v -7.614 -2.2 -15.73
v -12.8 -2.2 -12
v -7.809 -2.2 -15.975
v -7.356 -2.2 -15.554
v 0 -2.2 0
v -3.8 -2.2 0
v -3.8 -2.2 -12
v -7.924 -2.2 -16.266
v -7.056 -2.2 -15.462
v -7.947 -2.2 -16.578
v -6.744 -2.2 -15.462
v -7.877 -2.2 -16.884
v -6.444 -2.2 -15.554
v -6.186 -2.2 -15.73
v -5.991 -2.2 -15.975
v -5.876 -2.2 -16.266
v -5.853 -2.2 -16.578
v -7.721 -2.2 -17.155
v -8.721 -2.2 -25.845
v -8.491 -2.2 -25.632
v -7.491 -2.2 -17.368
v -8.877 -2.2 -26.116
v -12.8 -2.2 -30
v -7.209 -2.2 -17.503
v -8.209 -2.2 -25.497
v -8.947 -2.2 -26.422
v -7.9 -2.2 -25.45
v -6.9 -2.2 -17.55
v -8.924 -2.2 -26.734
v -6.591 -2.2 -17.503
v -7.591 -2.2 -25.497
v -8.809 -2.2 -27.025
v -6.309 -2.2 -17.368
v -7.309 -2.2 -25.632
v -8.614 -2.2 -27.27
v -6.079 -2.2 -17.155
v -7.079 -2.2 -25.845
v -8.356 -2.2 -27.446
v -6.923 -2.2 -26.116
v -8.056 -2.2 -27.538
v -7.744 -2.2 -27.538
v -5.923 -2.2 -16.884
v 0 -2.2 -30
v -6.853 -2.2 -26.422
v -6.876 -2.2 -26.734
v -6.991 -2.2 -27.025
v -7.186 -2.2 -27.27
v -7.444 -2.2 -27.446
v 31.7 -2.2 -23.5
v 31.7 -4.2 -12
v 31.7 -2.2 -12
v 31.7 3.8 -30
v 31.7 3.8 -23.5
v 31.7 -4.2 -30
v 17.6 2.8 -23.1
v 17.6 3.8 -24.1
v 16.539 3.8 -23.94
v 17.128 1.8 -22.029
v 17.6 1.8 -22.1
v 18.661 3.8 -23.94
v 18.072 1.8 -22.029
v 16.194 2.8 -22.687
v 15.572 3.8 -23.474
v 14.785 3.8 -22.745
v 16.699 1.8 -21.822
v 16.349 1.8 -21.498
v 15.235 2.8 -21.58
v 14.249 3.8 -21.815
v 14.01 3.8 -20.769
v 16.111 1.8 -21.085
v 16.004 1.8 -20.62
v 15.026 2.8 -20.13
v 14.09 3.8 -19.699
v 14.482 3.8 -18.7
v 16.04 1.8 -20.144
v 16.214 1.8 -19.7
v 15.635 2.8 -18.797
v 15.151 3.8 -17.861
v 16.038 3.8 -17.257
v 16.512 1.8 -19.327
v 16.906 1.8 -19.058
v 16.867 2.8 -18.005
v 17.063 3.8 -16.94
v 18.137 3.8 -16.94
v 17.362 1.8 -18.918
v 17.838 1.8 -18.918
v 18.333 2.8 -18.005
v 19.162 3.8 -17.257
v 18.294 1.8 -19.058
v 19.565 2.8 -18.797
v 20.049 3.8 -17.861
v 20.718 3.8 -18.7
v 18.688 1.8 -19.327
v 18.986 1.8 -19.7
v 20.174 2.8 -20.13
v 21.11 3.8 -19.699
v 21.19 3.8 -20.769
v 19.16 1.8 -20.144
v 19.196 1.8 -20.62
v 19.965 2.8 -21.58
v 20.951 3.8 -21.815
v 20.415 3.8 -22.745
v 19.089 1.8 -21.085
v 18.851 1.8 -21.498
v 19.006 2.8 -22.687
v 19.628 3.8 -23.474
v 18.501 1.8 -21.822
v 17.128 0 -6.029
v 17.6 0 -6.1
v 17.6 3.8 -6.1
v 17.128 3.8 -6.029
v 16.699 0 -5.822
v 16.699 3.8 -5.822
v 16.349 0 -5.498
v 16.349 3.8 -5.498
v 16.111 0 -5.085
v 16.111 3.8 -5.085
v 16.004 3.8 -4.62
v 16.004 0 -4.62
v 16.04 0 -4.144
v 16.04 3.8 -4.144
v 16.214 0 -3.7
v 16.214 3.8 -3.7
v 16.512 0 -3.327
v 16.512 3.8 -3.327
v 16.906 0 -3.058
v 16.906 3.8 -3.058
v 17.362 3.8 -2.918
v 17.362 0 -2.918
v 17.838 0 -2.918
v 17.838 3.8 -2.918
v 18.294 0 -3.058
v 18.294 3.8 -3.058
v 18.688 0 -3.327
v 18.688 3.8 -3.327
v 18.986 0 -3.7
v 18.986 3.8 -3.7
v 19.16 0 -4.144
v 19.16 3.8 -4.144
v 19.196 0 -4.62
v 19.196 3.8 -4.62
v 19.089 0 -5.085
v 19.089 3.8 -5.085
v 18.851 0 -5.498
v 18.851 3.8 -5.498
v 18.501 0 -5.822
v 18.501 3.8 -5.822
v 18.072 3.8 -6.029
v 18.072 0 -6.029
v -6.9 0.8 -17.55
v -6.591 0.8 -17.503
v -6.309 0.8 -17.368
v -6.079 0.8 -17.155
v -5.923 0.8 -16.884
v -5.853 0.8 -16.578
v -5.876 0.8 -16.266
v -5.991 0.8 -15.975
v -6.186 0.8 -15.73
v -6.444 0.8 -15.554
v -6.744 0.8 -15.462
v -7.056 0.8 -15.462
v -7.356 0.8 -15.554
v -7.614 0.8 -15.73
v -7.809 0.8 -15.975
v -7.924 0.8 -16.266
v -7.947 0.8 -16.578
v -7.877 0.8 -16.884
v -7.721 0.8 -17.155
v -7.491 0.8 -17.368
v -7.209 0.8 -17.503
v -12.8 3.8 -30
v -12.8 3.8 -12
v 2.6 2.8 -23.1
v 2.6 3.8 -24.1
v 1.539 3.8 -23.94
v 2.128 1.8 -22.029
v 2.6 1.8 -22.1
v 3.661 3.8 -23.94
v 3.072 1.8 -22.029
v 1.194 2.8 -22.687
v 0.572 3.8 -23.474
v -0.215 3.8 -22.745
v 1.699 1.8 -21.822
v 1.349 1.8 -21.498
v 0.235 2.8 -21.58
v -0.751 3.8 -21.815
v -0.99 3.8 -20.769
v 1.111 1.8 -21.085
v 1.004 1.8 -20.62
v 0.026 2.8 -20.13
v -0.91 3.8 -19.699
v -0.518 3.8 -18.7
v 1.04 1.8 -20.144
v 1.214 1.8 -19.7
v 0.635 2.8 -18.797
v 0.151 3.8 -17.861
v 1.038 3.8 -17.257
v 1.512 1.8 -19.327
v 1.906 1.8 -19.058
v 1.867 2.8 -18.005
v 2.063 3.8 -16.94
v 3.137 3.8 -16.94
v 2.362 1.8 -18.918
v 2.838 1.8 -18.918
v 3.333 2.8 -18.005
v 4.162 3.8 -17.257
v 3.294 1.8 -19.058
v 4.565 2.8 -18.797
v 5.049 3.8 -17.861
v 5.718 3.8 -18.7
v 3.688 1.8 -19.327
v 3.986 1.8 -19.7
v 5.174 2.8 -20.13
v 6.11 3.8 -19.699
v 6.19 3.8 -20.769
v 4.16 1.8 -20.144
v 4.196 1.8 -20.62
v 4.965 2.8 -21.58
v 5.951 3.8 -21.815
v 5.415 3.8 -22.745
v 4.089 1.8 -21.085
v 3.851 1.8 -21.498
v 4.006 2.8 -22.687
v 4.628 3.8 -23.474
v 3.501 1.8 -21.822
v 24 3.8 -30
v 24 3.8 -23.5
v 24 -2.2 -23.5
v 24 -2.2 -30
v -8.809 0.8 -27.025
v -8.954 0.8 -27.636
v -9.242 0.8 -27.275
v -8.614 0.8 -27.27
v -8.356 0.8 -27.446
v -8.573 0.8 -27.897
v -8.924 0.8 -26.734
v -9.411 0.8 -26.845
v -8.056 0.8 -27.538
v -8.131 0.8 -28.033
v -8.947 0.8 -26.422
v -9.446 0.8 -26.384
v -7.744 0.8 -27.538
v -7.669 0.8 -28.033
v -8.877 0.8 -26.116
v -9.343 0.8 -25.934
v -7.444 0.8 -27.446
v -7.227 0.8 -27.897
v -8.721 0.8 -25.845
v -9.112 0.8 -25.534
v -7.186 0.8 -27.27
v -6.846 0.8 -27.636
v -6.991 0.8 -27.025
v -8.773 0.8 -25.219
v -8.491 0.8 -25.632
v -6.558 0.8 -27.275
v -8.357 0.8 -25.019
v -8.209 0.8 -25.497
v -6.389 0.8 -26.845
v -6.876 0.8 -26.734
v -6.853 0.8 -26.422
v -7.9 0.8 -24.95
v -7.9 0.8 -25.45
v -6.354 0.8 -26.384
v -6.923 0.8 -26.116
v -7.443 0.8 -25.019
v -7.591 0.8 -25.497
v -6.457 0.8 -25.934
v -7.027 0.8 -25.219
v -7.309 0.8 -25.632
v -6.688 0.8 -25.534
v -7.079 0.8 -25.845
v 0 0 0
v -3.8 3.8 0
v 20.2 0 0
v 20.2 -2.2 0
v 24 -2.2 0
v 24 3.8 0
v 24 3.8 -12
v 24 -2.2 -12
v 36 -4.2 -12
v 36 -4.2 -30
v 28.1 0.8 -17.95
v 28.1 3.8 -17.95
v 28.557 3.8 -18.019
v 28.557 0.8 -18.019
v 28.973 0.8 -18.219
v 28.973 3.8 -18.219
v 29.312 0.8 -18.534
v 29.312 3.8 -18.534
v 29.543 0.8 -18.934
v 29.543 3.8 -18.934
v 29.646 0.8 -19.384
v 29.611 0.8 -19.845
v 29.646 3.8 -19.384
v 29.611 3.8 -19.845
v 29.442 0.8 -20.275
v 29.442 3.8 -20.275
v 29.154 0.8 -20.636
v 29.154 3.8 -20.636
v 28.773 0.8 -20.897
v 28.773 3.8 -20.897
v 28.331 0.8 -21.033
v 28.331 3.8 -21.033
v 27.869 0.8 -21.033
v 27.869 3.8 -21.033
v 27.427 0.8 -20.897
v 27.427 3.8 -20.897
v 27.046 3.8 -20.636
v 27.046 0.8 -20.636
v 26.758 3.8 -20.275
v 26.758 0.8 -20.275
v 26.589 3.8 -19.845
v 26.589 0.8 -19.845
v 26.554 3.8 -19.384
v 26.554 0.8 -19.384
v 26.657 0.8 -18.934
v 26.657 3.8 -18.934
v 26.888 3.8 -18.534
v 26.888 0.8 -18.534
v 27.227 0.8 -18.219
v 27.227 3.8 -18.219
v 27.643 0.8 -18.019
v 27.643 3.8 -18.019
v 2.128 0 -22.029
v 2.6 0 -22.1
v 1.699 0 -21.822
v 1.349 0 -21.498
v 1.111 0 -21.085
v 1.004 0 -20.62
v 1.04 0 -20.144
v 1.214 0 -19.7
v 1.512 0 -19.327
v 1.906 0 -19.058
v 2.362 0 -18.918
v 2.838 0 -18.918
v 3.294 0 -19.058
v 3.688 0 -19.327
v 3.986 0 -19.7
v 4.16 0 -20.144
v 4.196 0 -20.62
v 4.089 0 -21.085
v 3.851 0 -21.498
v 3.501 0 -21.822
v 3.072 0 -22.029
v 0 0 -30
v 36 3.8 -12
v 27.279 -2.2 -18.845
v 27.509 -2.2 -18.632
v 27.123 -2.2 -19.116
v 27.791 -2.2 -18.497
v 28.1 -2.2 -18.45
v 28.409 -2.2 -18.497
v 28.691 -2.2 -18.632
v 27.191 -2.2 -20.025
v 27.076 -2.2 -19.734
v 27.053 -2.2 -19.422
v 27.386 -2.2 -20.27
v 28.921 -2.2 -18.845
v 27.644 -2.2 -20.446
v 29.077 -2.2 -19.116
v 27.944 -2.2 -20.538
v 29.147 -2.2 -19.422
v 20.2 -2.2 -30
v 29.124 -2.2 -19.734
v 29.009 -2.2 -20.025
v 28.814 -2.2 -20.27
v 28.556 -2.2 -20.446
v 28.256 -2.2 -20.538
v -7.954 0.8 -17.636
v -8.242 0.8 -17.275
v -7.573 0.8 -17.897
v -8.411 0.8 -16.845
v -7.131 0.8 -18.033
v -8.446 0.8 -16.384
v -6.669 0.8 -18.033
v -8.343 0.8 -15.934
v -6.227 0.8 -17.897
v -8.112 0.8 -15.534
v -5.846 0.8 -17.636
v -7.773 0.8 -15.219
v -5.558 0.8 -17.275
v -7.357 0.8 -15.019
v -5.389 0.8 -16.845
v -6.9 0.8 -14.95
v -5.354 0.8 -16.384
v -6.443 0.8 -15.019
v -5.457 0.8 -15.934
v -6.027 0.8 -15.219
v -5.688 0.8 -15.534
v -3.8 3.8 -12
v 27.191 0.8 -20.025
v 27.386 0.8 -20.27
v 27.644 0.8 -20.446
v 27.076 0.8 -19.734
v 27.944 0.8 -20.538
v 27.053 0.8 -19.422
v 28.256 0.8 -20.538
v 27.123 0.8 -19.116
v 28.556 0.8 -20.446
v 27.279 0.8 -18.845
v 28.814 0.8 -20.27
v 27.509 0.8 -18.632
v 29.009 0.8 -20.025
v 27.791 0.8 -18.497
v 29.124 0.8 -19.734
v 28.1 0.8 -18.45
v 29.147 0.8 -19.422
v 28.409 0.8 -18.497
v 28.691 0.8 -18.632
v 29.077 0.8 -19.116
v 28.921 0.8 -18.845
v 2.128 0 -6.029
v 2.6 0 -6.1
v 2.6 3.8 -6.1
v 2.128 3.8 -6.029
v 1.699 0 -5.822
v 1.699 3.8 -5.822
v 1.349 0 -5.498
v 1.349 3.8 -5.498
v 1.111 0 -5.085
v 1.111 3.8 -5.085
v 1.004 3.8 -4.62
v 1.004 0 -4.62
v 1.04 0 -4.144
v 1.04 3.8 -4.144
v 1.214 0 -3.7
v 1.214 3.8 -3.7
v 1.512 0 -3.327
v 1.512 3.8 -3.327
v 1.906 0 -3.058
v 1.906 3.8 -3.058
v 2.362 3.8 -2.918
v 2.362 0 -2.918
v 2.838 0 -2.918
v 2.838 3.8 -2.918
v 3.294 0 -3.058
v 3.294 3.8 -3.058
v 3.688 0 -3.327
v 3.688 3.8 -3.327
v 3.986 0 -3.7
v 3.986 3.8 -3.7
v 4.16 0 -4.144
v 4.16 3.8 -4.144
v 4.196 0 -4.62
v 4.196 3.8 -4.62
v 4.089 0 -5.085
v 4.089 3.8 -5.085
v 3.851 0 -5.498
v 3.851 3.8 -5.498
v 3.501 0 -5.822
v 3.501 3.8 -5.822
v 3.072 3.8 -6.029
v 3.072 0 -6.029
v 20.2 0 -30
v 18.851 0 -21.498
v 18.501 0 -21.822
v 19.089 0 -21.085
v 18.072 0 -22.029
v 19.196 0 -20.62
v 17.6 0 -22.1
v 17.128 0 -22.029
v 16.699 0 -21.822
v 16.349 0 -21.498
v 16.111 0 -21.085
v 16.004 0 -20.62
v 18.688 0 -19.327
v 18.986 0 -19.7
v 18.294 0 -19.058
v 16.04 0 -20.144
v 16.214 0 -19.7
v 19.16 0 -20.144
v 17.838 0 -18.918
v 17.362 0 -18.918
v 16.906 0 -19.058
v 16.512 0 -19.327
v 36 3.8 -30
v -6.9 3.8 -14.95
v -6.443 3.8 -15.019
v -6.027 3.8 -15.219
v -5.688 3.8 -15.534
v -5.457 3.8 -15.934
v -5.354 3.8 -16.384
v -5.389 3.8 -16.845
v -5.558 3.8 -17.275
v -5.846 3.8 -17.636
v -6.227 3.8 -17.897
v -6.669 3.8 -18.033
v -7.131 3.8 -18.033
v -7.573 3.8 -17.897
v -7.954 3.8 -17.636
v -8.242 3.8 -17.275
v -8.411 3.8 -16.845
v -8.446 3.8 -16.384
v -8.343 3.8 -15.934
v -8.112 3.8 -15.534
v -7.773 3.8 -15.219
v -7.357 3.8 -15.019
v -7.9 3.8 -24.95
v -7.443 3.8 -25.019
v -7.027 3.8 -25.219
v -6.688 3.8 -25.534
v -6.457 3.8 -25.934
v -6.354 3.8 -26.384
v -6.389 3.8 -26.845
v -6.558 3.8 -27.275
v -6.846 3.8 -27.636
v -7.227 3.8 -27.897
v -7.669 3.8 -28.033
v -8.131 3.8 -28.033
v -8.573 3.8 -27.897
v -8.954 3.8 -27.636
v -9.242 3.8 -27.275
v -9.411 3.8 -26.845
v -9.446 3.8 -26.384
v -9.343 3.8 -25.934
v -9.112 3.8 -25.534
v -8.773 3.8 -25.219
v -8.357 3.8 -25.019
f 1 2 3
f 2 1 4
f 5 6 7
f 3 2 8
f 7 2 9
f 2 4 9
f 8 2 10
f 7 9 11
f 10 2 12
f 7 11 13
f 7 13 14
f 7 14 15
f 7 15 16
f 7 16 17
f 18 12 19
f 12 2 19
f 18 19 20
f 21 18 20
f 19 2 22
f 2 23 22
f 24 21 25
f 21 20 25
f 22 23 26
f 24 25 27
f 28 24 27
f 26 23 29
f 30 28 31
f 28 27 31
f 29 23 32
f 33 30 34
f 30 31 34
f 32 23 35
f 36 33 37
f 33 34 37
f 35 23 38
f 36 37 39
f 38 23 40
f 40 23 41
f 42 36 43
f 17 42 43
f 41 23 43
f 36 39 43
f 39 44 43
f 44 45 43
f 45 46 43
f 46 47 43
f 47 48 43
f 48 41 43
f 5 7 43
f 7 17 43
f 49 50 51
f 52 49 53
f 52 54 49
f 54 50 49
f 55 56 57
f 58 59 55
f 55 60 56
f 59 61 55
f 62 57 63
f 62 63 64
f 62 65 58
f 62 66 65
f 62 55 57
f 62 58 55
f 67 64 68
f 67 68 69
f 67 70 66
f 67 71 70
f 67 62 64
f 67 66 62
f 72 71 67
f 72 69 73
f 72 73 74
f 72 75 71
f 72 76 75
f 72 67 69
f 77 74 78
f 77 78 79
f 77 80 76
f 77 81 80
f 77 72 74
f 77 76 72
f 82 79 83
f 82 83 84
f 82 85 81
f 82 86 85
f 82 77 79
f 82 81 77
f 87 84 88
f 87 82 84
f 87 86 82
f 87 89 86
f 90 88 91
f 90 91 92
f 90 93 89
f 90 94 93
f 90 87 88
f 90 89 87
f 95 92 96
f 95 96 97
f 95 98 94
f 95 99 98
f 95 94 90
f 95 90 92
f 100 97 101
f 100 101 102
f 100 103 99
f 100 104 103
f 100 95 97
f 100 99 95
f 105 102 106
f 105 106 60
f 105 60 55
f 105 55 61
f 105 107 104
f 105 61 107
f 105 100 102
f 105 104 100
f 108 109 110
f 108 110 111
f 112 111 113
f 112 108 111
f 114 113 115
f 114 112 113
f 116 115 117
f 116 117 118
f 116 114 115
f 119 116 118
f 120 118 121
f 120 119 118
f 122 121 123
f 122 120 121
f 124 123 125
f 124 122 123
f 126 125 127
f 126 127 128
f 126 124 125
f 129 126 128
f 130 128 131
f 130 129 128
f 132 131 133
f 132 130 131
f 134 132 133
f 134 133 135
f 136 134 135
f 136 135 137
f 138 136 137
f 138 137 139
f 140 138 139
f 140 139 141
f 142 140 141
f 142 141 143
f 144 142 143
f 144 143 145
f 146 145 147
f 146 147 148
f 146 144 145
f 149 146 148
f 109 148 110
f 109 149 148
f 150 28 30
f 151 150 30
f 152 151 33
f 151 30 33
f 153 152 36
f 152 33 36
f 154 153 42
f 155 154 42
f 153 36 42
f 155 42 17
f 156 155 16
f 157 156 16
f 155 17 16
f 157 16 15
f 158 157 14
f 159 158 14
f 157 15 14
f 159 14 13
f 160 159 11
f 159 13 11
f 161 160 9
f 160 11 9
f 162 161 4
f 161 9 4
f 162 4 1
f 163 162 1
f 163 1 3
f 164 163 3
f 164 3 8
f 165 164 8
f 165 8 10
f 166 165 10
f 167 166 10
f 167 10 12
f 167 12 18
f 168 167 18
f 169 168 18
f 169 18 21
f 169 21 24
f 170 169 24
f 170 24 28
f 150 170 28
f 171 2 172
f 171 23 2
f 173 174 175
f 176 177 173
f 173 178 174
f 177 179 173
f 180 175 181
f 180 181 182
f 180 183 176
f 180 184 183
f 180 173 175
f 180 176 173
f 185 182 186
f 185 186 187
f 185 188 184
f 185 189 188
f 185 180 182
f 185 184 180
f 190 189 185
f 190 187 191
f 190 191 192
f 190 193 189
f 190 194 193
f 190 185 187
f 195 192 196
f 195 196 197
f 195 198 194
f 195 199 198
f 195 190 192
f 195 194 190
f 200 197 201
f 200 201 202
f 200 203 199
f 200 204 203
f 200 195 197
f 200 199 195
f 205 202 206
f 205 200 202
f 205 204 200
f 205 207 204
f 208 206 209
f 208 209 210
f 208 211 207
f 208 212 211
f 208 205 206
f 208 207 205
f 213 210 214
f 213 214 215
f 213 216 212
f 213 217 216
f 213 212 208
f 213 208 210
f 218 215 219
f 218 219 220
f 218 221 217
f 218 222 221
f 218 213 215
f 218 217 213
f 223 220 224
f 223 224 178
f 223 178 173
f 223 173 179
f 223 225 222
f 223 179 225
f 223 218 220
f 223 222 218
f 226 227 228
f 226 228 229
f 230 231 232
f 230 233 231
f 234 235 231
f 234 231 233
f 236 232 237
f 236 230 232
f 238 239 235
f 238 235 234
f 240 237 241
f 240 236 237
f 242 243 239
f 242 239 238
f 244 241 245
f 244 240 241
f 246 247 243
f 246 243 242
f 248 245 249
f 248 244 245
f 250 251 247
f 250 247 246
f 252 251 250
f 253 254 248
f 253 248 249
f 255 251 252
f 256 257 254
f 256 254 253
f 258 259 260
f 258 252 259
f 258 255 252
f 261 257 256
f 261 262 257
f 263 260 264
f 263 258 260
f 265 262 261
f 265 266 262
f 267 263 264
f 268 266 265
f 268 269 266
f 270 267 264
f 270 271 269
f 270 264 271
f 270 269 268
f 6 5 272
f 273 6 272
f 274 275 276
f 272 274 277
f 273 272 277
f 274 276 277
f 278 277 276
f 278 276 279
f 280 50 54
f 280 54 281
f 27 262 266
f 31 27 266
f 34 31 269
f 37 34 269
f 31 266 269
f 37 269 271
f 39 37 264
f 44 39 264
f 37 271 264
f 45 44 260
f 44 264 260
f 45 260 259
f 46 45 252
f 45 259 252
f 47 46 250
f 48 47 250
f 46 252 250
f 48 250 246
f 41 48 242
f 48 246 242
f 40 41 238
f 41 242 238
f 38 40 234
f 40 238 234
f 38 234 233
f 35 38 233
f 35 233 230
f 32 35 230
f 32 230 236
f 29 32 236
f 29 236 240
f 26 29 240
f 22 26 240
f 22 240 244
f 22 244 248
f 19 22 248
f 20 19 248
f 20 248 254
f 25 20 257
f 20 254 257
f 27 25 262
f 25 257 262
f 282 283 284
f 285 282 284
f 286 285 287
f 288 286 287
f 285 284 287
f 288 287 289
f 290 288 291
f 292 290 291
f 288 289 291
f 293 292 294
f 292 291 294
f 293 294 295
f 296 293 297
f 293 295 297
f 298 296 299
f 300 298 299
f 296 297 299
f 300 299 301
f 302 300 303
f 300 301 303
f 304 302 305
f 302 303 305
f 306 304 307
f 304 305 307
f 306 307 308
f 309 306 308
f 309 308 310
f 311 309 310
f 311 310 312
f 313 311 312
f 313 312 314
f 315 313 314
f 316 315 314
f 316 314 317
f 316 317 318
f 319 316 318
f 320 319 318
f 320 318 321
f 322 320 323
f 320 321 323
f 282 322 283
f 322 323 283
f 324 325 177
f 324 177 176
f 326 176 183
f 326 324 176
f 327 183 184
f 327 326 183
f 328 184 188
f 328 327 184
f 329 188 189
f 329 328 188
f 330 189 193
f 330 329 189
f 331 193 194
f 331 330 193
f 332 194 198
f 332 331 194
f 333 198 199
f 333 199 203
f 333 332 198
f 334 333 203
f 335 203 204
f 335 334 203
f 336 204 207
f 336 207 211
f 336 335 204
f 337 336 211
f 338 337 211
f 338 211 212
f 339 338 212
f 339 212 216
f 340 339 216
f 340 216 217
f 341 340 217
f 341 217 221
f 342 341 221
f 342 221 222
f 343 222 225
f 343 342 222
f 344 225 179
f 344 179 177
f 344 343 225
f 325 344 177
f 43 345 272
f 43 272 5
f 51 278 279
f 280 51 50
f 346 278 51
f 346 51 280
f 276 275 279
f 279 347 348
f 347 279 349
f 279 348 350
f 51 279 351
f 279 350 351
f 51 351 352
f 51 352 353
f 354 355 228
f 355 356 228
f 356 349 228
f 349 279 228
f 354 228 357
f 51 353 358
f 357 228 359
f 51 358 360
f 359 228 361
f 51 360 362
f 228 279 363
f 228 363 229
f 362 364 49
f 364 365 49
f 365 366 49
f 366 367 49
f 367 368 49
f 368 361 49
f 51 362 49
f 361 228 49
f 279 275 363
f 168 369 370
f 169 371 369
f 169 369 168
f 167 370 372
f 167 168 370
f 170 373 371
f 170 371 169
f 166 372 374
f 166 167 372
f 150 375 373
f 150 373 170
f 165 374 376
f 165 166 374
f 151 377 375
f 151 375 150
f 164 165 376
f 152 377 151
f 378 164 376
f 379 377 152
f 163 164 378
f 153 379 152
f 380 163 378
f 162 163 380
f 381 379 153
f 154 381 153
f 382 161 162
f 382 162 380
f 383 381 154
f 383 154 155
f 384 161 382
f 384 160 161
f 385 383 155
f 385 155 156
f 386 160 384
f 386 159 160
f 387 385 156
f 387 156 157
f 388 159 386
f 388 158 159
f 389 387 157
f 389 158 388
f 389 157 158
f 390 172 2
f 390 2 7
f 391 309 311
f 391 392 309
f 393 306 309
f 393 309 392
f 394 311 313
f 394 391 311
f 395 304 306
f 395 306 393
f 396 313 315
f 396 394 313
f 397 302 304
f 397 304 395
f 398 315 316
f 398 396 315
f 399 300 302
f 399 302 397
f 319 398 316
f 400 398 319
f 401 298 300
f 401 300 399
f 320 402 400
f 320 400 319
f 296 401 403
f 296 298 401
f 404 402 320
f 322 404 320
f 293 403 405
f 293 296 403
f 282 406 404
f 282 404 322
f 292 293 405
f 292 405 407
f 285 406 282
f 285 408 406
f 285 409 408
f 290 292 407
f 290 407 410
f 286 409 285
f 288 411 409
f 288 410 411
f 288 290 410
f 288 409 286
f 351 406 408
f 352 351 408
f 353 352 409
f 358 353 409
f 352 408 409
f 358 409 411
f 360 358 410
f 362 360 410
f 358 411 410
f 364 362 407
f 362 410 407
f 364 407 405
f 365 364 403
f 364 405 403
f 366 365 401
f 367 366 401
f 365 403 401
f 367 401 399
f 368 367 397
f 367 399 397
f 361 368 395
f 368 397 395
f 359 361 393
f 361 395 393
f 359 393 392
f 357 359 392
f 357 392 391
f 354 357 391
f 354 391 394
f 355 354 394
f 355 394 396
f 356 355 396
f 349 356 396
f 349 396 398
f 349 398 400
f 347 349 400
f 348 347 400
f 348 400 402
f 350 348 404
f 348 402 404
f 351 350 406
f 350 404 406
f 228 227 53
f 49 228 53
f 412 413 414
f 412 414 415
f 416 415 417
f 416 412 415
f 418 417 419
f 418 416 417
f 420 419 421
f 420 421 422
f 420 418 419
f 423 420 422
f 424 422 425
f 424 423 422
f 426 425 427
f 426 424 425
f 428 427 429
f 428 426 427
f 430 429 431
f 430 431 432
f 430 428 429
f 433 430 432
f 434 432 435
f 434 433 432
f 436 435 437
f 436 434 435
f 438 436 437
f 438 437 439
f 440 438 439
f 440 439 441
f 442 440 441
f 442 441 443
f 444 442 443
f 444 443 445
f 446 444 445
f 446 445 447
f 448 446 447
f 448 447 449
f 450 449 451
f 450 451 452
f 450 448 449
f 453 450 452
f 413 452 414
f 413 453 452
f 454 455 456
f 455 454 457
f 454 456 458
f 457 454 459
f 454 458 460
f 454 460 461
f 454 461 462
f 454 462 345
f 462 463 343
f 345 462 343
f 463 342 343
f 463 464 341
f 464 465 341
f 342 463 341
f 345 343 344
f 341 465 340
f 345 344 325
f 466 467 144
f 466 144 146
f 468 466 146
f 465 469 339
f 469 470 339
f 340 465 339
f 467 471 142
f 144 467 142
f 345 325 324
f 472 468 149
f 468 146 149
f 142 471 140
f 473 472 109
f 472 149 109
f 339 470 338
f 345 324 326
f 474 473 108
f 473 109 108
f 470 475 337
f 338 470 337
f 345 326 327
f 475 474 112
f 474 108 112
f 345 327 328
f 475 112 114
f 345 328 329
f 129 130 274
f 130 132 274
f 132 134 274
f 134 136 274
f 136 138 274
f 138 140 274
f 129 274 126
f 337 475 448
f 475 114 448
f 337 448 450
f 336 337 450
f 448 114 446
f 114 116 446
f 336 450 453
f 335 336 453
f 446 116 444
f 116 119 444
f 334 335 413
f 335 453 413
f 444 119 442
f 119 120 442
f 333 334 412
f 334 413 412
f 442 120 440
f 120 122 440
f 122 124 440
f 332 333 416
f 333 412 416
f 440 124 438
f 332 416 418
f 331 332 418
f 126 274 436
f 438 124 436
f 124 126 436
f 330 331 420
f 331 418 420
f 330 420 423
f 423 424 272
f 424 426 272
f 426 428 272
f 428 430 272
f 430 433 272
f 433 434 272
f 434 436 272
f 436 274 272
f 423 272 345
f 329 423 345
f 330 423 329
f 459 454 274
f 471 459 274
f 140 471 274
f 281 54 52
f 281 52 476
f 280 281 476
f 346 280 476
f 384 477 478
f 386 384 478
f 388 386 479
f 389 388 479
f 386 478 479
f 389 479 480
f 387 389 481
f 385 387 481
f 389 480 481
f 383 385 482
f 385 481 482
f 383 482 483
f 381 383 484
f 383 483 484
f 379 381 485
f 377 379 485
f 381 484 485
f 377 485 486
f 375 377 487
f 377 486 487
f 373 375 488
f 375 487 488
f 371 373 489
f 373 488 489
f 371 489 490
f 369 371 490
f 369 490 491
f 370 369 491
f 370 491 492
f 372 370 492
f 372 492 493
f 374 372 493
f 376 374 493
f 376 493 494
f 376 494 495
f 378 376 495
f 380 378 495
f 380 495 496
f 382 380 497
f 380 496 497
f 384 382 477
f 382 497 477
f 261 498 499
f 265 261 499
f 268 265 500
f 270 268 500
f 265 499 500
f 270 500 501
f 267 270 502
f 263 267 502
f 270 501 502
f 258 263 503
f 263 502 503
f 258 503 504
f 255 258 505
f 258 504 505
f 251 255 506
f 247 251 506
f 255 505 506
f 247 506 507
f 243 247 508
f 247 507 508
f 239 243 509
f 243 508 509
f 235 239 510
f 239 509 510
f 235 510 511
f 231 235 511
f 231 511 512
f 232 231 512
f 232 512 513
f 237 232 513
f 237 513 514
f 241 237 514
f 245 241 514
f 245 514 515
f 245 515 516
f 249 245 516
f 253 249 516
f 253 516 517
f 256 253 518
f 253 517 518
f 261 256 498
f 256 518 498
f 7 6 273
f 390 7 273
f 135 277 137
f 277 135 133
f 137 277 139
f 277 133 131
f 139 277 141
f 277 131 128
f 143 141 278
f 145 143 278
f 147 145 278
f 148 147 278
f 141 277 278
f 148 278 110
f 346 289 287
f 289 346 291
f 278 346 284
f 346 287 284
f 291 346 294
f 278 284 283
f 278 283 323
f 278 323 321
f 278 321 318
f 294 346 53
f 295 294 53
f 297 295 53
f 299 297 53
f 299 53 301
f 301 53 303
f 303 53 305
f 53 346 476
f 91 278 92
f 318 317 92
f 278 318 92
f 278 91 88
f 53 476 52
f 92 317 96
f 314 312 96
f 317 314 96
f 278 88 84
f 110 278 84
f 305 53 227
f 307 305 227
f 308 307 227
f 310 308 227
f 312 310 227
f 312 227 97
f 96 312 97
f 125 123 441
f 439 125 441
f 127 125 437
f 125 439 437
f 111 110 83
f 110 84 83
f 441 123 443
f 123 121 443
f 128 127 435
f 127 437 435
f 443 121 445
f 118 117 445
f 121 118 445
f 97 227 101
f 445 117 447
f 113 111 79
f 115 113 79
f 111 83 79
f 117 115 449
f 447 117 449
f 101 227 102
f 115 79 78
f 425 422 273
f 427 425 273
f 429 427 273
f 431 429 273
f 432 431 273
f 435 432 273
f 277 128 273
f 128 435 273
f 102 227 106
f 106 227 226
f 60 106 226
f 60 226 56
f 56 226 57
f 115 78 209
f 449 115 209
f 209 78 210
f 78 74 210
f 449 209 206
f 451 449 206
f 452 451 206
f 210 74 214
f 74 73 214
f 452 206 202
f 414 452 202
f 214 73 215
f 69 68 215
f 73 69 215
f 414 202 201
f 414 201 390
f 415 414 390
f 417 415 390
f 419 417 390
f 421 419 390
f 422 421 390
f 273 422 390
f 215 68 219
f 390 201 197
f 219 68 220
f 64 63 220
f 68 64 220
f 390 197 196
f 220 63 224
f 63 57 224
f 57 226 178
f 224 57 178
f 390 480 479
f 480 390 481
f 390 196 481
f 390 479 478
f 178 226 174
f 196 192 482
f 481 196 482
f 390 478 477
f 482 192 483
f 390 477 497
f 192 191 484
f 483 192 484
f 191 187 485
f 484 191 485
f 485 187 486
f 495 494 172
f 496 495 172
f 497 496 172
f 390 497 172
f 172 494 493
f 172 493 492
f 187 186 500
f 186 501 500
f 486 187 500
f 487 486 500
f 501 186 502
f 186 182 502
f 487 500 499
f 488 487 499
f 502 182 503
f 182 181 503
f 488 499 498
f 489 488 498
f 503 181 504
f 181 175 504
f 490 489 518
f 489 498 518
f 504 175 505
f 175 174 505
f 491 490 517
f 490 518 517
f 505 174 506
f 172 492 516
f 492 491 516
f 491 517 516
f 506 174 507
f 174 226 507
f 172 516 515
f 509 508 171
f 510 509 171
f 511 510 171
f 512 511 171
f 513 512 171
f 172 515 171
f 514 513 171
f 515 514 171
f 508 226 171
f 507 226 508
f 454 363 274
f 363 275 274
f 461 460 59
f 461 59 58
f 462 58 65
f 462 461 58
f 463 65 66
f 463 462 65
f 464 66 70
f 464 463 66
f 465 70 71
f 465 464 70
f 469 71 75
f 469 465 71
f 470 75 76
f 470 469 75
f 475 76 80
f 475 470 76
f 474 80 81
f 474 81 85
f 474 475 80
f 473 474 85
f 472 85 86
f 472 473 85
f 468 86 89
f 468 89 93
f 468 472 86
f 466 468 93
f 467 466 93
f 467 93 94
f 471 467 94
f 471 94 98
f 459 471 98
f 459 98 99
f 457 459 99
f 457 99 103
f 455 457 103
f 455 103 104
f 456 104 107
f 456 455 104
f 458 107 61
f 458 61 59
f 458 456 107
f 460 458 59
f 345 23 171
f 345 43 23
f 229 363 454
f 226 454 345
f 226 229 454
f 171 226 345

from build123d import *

# Parameters (mm, degrees)
SKETCH_1_W          = 20.2
SKETCH_1_H          = 25
SKETCH_1_R          = 1.6
EXTRUDE_1_DEPTH     = 3.8
SKETCH_2_W          = 25
SKETCH_2_H          = 6
EXTRUDE_2_DEPTH     = 3.8
SKETCH_3_W          = 25
SKETCH_3_H          = 6
EXTRUDE_3_DEPTH     = 3.8
SKETCH_4_W          = 8
SKETCH_4_H          = 6
EXTRUDE_4_DEPTH     = 12
SKETCH_5_W          = 4.3
SKETCH_5_H          = 6
EXTRUDE_5_DEPTH     = 6
SKETCH_6_W          = 4.3
SKETCH_6_H          = 14
EXTRUDE_6_DEPTH     = 2
SKETCH_7_W          = 20.2
SKETCH_7_H          = 3.8
EXTRUDE_7_DEPTH     = 5
SKETCH_8_W          = 10
SKETCH_8_H          = 6
EXTRUDE_8_DEPTH     = 9
SKETCH_9_R          = 1.55
CUT_EXTRUDE_1_DEPTH = 3
SKETCH_10_R         = 1.05
CUT_EXTRUDE_2_DEPTH = 3
SKETCH_11_W         = 9
SKETCH_11_H         = 6
EXTRUDE_9_DEPTH     = 8
SKETCH_12_R         = 1.05
CUT_EXTRUDE_3_DEPTH = 48.885279575
CHAMFER_1_SIZE      = 2
SKETCH_13_R         = 1.55
CUT_EXTRUDE_4_DEPTH = 3
SKETCH_14_W         = 4.3
SKETCH_14_H         = 2
EXTRUDE_10_DEPTH    = 5
SKETCH_15_W         = 4.3
SKETCH_15_H         = 1
SKETCH_15_W_2       = 7.7
SKETCH_15_H_2       = 1.5
CUT_EXTRUDE_5_DEPTH = 10


with BuildPart() as part:
    # 草图1 → 凸台-拉伸1 (new body)
    with BuildSketch(Plane(origin=(0, 0, 0), x_dir=(1, 0, 0), z_dir=(0, 1, 0))):
        with Locations((10.1, 12.5)):
            Rectangle(SKETCH_1_W, SKETCH_1_H)
        with Locations(Location((2.6, 4.5, 0), (0, 0, 90))):
            Circle(SKETCH_1_R, mode=Mode.SUBTRACT)
        with Locations(Location((17.6, 4.5, 0), (0, 0, 90))):
            Circle(SKETCH_1_R, mode=Mode.SUBTRACT)
        with Locations(Location((17.6, 20.5, 0), (0, 0, 90))):
            Circle(SKETCH_1_R, mode=Mode.SUBTRACT)
        with Locations(Location((2.6, 20.5, 0), (0, 0, 90))):
            Circle(SKETCH_1_R, mode=Mode.SUBTRACT)
    extrude(amount=EXTRUDE_1_DEPTH)

    # 草图2 → 凸台-拉伸2 (add)
    with BuildSketch(Plane(origin=(20.2, 0, 0), x_dir=(0, 0, -1), z_dir=(1, 0, 0))):
        with Locations((12.5, 0.8)):
            Rectangle(SKETCH_2_W, SKETCH_2_H)
    extrude(amount=EXTRUDE_2_DEPTH)

    # 草图3 → 凸台-拉伸3 (add)
    with BuildSketch(Plane.ZY):
        with Locations((-12.5, 0.8)):
            Rectangle(SKETCH_3_W, SKETCH_3_H)
    extrude(amount=EXTRUDE_3_DEPTH)

    # 草图4 → 凸台-拉伸4 (add)
    with BuildSketch(Plane(origin=(24, 0, 0), x_dir=(0, 0, -1), z_dir=(1, 0, 0))):
        with Locations((21, 0.8)):
            Rectangle(SKETCH_4_W, SKETCH_4_H)
    extrude(amount=EXTRUDE_4_DEPTH)

    # 草图5 → 凸台-拉伸5 (add)
    with BuildSketch(Plane(origin=(0, 0, -25), x_dir=(-1, 0, 0), z_dir=(0, 0, -1))):
        with Locations((-33.85, 0.8)):
            Rectangle(SKETCH_5_W, SKETCH_5_H)
    extrude(amount=EXTRUDE_5_DEPTH)

    # 草图6 → 凸台-拉伸6 (add)
    with BuildSketch(Plane(origin=(0, -2.2, 0), x_dir=(-1, 0, 0), z_dir=(0, -1, 0))):
        with Locations((-33.85, 24)):
            Rectangle(SKETCH_6_W, SKETCH_6_H)
    extrude(amount=EXTRUDE_6_DEPTH)

    # 草图7 → 凸台-拉伸7 (add)
    with BuildSketch(Plane(origin=(0, 0, -25), x_dir=(-1, 0, 0), z_dir=(0, 0, -1))):
        Polygon((-20.2, 0), (-20.2, 3.8), (-24, 3.8), (-24, -2.2), (-20.2, -2.2), align=None)
        with Locations((-10.1, 1.9)):
            Rectangle(SKETCH_7_W, SKETCH_7_H)
        Polygon((3.8, -2.2), (3.8, 3.8), (0, 3.8), (0, 0), (0, -2.2), align=None)
    extrude(amount=EXTRUDE_7_DEPTH)

    # 草图8 → 凸台-拉伸8 (add)
    with BuildSketch(Plane.ZY.offset(3.8)):
        with Locations((-25, 0.8)):
            Rectangle(SKETCH_8_W, SKETCH_8_H)
    extrude(amount=EXTRUDE_8_DEPTH)

    # 草图9 → 切除-拉伸1 (cut)
    with BuildSketch(Plane(origin=(0, 3.8, 0), x_dir=(1, 0, 0), z_dir=(0, 1, 0))):
        with Locations(Location((-7.9, 26.5, 0), (0, 0, 270))):
            Circle(SKETCH_9_R)
        with Locations(Location((28.1, 19.5, 0), (0, 0, 270))):
            Circle(SKETCH_9_R)
    extrude(amount=-CUT_EXTRUDE_1_DEPTH, mode=Mode.SUBTRACT)

    # 草图10 → 切除-拉伸2 (cut)
    with BuildSketch(Plane(origin=(0, 0.8, 0), x_dir=(1, 0, 0), z_dir=(0, 1, 0))):
        with Locations(Location((-7.9, 26.5, 0), (0, 0, 270))):
            Circle(SKETCH_10_R)
        with Locations(Location((28.1, 19.5, 0), (0, 0, 270))):
            Circle(SKETCH_10_R)
    extrude(amount=-CUT_EXTRUDE_2_DEPTH, mode=Mode.SUBTRACT)

    # 草图11 → 凸台-拉伸9 (add)
    with BuildSketch(Plane.XY.offset(-20)):
        with Locations((-8.3, 0.8)):
            Rectangle(SKETCH_11_W, SKETCH_11_H)
    extrude(amount=EXTRUDE_9_DEPTH)

    # 草图12 → 切除-拉伸3 (cut, through all)
    with BuildSketch(Plane(origin=(0, -2.2, 0), x_dir=(-1, 0, 0), z_dir=(0, -1, 0))):
        with Locations(Location((6.9, 16.5, 0), (0, 0, 90))):
            Circle(SKETCH_12_R)
    extrude(amount=-CUT_EXTRUDE_3_DEPTH, mode=Mode.SUBTRACT)

    # 倒角1
    chamfer_1_edges = [part.edges().sort_by_distance(p)[0] for p in [
        (17.6, 3.8, -18.9),
        (2.6, 3.8, -18.9),
    ]]
    chamfer(chamfer_1_edges, length=CHAMFER_1_SIZE)

    # 草图13 → 切除-拉伸4 (cut)
    with BuildSketch(Plane(origin=(0, 3.8, 0), x_dir=(1, 0, 0), z_dir=(0, 1, 0))):
        with Locations(Location((-6.9, 16.5, 0), (0, 0, 270))):
            Circle(SKETCH_13_R)
    extrude(amount=-CUT_EXTRUDE_4_DEPTH, mode=Mode.SUBTRACT)

    # 草图14 → 凸台-拉伸10 (add)
    with BuildSketch(Plane.XY.offset(-17)):
        Polygon((24, 3.8), (24, -2.2), (31.7, -2.2), (36, -2.2), (36, 3.8), align=None)
        with Locations((33.85, -3.2)):
            Rectangle(SKETCH_14_W, SKETCH_14_H)
    extrude(amount=EXTRUDE_10_DEPTH)

    # 草图15 → 切除-拉伸5 (cut)
    with BuildSketch(Plane(origin=(0, 3.8, 0), x_dir=(1, 0, 0), z_dir=(0, 1, 0))):
        with Locations((33.85, 30.5)):
            Rectangle(SKETCH_15_W, SKETCH_15_H)
        with Locations((27.85, 24.25)):
            Rectangle(SKETCH_15_W_2, SKETCH_15_H_2)
    extrude(amount=-CUT_EXTRUDE_5_DEPTH, mode=Mode.SUBTRACT)


solid = part.part
